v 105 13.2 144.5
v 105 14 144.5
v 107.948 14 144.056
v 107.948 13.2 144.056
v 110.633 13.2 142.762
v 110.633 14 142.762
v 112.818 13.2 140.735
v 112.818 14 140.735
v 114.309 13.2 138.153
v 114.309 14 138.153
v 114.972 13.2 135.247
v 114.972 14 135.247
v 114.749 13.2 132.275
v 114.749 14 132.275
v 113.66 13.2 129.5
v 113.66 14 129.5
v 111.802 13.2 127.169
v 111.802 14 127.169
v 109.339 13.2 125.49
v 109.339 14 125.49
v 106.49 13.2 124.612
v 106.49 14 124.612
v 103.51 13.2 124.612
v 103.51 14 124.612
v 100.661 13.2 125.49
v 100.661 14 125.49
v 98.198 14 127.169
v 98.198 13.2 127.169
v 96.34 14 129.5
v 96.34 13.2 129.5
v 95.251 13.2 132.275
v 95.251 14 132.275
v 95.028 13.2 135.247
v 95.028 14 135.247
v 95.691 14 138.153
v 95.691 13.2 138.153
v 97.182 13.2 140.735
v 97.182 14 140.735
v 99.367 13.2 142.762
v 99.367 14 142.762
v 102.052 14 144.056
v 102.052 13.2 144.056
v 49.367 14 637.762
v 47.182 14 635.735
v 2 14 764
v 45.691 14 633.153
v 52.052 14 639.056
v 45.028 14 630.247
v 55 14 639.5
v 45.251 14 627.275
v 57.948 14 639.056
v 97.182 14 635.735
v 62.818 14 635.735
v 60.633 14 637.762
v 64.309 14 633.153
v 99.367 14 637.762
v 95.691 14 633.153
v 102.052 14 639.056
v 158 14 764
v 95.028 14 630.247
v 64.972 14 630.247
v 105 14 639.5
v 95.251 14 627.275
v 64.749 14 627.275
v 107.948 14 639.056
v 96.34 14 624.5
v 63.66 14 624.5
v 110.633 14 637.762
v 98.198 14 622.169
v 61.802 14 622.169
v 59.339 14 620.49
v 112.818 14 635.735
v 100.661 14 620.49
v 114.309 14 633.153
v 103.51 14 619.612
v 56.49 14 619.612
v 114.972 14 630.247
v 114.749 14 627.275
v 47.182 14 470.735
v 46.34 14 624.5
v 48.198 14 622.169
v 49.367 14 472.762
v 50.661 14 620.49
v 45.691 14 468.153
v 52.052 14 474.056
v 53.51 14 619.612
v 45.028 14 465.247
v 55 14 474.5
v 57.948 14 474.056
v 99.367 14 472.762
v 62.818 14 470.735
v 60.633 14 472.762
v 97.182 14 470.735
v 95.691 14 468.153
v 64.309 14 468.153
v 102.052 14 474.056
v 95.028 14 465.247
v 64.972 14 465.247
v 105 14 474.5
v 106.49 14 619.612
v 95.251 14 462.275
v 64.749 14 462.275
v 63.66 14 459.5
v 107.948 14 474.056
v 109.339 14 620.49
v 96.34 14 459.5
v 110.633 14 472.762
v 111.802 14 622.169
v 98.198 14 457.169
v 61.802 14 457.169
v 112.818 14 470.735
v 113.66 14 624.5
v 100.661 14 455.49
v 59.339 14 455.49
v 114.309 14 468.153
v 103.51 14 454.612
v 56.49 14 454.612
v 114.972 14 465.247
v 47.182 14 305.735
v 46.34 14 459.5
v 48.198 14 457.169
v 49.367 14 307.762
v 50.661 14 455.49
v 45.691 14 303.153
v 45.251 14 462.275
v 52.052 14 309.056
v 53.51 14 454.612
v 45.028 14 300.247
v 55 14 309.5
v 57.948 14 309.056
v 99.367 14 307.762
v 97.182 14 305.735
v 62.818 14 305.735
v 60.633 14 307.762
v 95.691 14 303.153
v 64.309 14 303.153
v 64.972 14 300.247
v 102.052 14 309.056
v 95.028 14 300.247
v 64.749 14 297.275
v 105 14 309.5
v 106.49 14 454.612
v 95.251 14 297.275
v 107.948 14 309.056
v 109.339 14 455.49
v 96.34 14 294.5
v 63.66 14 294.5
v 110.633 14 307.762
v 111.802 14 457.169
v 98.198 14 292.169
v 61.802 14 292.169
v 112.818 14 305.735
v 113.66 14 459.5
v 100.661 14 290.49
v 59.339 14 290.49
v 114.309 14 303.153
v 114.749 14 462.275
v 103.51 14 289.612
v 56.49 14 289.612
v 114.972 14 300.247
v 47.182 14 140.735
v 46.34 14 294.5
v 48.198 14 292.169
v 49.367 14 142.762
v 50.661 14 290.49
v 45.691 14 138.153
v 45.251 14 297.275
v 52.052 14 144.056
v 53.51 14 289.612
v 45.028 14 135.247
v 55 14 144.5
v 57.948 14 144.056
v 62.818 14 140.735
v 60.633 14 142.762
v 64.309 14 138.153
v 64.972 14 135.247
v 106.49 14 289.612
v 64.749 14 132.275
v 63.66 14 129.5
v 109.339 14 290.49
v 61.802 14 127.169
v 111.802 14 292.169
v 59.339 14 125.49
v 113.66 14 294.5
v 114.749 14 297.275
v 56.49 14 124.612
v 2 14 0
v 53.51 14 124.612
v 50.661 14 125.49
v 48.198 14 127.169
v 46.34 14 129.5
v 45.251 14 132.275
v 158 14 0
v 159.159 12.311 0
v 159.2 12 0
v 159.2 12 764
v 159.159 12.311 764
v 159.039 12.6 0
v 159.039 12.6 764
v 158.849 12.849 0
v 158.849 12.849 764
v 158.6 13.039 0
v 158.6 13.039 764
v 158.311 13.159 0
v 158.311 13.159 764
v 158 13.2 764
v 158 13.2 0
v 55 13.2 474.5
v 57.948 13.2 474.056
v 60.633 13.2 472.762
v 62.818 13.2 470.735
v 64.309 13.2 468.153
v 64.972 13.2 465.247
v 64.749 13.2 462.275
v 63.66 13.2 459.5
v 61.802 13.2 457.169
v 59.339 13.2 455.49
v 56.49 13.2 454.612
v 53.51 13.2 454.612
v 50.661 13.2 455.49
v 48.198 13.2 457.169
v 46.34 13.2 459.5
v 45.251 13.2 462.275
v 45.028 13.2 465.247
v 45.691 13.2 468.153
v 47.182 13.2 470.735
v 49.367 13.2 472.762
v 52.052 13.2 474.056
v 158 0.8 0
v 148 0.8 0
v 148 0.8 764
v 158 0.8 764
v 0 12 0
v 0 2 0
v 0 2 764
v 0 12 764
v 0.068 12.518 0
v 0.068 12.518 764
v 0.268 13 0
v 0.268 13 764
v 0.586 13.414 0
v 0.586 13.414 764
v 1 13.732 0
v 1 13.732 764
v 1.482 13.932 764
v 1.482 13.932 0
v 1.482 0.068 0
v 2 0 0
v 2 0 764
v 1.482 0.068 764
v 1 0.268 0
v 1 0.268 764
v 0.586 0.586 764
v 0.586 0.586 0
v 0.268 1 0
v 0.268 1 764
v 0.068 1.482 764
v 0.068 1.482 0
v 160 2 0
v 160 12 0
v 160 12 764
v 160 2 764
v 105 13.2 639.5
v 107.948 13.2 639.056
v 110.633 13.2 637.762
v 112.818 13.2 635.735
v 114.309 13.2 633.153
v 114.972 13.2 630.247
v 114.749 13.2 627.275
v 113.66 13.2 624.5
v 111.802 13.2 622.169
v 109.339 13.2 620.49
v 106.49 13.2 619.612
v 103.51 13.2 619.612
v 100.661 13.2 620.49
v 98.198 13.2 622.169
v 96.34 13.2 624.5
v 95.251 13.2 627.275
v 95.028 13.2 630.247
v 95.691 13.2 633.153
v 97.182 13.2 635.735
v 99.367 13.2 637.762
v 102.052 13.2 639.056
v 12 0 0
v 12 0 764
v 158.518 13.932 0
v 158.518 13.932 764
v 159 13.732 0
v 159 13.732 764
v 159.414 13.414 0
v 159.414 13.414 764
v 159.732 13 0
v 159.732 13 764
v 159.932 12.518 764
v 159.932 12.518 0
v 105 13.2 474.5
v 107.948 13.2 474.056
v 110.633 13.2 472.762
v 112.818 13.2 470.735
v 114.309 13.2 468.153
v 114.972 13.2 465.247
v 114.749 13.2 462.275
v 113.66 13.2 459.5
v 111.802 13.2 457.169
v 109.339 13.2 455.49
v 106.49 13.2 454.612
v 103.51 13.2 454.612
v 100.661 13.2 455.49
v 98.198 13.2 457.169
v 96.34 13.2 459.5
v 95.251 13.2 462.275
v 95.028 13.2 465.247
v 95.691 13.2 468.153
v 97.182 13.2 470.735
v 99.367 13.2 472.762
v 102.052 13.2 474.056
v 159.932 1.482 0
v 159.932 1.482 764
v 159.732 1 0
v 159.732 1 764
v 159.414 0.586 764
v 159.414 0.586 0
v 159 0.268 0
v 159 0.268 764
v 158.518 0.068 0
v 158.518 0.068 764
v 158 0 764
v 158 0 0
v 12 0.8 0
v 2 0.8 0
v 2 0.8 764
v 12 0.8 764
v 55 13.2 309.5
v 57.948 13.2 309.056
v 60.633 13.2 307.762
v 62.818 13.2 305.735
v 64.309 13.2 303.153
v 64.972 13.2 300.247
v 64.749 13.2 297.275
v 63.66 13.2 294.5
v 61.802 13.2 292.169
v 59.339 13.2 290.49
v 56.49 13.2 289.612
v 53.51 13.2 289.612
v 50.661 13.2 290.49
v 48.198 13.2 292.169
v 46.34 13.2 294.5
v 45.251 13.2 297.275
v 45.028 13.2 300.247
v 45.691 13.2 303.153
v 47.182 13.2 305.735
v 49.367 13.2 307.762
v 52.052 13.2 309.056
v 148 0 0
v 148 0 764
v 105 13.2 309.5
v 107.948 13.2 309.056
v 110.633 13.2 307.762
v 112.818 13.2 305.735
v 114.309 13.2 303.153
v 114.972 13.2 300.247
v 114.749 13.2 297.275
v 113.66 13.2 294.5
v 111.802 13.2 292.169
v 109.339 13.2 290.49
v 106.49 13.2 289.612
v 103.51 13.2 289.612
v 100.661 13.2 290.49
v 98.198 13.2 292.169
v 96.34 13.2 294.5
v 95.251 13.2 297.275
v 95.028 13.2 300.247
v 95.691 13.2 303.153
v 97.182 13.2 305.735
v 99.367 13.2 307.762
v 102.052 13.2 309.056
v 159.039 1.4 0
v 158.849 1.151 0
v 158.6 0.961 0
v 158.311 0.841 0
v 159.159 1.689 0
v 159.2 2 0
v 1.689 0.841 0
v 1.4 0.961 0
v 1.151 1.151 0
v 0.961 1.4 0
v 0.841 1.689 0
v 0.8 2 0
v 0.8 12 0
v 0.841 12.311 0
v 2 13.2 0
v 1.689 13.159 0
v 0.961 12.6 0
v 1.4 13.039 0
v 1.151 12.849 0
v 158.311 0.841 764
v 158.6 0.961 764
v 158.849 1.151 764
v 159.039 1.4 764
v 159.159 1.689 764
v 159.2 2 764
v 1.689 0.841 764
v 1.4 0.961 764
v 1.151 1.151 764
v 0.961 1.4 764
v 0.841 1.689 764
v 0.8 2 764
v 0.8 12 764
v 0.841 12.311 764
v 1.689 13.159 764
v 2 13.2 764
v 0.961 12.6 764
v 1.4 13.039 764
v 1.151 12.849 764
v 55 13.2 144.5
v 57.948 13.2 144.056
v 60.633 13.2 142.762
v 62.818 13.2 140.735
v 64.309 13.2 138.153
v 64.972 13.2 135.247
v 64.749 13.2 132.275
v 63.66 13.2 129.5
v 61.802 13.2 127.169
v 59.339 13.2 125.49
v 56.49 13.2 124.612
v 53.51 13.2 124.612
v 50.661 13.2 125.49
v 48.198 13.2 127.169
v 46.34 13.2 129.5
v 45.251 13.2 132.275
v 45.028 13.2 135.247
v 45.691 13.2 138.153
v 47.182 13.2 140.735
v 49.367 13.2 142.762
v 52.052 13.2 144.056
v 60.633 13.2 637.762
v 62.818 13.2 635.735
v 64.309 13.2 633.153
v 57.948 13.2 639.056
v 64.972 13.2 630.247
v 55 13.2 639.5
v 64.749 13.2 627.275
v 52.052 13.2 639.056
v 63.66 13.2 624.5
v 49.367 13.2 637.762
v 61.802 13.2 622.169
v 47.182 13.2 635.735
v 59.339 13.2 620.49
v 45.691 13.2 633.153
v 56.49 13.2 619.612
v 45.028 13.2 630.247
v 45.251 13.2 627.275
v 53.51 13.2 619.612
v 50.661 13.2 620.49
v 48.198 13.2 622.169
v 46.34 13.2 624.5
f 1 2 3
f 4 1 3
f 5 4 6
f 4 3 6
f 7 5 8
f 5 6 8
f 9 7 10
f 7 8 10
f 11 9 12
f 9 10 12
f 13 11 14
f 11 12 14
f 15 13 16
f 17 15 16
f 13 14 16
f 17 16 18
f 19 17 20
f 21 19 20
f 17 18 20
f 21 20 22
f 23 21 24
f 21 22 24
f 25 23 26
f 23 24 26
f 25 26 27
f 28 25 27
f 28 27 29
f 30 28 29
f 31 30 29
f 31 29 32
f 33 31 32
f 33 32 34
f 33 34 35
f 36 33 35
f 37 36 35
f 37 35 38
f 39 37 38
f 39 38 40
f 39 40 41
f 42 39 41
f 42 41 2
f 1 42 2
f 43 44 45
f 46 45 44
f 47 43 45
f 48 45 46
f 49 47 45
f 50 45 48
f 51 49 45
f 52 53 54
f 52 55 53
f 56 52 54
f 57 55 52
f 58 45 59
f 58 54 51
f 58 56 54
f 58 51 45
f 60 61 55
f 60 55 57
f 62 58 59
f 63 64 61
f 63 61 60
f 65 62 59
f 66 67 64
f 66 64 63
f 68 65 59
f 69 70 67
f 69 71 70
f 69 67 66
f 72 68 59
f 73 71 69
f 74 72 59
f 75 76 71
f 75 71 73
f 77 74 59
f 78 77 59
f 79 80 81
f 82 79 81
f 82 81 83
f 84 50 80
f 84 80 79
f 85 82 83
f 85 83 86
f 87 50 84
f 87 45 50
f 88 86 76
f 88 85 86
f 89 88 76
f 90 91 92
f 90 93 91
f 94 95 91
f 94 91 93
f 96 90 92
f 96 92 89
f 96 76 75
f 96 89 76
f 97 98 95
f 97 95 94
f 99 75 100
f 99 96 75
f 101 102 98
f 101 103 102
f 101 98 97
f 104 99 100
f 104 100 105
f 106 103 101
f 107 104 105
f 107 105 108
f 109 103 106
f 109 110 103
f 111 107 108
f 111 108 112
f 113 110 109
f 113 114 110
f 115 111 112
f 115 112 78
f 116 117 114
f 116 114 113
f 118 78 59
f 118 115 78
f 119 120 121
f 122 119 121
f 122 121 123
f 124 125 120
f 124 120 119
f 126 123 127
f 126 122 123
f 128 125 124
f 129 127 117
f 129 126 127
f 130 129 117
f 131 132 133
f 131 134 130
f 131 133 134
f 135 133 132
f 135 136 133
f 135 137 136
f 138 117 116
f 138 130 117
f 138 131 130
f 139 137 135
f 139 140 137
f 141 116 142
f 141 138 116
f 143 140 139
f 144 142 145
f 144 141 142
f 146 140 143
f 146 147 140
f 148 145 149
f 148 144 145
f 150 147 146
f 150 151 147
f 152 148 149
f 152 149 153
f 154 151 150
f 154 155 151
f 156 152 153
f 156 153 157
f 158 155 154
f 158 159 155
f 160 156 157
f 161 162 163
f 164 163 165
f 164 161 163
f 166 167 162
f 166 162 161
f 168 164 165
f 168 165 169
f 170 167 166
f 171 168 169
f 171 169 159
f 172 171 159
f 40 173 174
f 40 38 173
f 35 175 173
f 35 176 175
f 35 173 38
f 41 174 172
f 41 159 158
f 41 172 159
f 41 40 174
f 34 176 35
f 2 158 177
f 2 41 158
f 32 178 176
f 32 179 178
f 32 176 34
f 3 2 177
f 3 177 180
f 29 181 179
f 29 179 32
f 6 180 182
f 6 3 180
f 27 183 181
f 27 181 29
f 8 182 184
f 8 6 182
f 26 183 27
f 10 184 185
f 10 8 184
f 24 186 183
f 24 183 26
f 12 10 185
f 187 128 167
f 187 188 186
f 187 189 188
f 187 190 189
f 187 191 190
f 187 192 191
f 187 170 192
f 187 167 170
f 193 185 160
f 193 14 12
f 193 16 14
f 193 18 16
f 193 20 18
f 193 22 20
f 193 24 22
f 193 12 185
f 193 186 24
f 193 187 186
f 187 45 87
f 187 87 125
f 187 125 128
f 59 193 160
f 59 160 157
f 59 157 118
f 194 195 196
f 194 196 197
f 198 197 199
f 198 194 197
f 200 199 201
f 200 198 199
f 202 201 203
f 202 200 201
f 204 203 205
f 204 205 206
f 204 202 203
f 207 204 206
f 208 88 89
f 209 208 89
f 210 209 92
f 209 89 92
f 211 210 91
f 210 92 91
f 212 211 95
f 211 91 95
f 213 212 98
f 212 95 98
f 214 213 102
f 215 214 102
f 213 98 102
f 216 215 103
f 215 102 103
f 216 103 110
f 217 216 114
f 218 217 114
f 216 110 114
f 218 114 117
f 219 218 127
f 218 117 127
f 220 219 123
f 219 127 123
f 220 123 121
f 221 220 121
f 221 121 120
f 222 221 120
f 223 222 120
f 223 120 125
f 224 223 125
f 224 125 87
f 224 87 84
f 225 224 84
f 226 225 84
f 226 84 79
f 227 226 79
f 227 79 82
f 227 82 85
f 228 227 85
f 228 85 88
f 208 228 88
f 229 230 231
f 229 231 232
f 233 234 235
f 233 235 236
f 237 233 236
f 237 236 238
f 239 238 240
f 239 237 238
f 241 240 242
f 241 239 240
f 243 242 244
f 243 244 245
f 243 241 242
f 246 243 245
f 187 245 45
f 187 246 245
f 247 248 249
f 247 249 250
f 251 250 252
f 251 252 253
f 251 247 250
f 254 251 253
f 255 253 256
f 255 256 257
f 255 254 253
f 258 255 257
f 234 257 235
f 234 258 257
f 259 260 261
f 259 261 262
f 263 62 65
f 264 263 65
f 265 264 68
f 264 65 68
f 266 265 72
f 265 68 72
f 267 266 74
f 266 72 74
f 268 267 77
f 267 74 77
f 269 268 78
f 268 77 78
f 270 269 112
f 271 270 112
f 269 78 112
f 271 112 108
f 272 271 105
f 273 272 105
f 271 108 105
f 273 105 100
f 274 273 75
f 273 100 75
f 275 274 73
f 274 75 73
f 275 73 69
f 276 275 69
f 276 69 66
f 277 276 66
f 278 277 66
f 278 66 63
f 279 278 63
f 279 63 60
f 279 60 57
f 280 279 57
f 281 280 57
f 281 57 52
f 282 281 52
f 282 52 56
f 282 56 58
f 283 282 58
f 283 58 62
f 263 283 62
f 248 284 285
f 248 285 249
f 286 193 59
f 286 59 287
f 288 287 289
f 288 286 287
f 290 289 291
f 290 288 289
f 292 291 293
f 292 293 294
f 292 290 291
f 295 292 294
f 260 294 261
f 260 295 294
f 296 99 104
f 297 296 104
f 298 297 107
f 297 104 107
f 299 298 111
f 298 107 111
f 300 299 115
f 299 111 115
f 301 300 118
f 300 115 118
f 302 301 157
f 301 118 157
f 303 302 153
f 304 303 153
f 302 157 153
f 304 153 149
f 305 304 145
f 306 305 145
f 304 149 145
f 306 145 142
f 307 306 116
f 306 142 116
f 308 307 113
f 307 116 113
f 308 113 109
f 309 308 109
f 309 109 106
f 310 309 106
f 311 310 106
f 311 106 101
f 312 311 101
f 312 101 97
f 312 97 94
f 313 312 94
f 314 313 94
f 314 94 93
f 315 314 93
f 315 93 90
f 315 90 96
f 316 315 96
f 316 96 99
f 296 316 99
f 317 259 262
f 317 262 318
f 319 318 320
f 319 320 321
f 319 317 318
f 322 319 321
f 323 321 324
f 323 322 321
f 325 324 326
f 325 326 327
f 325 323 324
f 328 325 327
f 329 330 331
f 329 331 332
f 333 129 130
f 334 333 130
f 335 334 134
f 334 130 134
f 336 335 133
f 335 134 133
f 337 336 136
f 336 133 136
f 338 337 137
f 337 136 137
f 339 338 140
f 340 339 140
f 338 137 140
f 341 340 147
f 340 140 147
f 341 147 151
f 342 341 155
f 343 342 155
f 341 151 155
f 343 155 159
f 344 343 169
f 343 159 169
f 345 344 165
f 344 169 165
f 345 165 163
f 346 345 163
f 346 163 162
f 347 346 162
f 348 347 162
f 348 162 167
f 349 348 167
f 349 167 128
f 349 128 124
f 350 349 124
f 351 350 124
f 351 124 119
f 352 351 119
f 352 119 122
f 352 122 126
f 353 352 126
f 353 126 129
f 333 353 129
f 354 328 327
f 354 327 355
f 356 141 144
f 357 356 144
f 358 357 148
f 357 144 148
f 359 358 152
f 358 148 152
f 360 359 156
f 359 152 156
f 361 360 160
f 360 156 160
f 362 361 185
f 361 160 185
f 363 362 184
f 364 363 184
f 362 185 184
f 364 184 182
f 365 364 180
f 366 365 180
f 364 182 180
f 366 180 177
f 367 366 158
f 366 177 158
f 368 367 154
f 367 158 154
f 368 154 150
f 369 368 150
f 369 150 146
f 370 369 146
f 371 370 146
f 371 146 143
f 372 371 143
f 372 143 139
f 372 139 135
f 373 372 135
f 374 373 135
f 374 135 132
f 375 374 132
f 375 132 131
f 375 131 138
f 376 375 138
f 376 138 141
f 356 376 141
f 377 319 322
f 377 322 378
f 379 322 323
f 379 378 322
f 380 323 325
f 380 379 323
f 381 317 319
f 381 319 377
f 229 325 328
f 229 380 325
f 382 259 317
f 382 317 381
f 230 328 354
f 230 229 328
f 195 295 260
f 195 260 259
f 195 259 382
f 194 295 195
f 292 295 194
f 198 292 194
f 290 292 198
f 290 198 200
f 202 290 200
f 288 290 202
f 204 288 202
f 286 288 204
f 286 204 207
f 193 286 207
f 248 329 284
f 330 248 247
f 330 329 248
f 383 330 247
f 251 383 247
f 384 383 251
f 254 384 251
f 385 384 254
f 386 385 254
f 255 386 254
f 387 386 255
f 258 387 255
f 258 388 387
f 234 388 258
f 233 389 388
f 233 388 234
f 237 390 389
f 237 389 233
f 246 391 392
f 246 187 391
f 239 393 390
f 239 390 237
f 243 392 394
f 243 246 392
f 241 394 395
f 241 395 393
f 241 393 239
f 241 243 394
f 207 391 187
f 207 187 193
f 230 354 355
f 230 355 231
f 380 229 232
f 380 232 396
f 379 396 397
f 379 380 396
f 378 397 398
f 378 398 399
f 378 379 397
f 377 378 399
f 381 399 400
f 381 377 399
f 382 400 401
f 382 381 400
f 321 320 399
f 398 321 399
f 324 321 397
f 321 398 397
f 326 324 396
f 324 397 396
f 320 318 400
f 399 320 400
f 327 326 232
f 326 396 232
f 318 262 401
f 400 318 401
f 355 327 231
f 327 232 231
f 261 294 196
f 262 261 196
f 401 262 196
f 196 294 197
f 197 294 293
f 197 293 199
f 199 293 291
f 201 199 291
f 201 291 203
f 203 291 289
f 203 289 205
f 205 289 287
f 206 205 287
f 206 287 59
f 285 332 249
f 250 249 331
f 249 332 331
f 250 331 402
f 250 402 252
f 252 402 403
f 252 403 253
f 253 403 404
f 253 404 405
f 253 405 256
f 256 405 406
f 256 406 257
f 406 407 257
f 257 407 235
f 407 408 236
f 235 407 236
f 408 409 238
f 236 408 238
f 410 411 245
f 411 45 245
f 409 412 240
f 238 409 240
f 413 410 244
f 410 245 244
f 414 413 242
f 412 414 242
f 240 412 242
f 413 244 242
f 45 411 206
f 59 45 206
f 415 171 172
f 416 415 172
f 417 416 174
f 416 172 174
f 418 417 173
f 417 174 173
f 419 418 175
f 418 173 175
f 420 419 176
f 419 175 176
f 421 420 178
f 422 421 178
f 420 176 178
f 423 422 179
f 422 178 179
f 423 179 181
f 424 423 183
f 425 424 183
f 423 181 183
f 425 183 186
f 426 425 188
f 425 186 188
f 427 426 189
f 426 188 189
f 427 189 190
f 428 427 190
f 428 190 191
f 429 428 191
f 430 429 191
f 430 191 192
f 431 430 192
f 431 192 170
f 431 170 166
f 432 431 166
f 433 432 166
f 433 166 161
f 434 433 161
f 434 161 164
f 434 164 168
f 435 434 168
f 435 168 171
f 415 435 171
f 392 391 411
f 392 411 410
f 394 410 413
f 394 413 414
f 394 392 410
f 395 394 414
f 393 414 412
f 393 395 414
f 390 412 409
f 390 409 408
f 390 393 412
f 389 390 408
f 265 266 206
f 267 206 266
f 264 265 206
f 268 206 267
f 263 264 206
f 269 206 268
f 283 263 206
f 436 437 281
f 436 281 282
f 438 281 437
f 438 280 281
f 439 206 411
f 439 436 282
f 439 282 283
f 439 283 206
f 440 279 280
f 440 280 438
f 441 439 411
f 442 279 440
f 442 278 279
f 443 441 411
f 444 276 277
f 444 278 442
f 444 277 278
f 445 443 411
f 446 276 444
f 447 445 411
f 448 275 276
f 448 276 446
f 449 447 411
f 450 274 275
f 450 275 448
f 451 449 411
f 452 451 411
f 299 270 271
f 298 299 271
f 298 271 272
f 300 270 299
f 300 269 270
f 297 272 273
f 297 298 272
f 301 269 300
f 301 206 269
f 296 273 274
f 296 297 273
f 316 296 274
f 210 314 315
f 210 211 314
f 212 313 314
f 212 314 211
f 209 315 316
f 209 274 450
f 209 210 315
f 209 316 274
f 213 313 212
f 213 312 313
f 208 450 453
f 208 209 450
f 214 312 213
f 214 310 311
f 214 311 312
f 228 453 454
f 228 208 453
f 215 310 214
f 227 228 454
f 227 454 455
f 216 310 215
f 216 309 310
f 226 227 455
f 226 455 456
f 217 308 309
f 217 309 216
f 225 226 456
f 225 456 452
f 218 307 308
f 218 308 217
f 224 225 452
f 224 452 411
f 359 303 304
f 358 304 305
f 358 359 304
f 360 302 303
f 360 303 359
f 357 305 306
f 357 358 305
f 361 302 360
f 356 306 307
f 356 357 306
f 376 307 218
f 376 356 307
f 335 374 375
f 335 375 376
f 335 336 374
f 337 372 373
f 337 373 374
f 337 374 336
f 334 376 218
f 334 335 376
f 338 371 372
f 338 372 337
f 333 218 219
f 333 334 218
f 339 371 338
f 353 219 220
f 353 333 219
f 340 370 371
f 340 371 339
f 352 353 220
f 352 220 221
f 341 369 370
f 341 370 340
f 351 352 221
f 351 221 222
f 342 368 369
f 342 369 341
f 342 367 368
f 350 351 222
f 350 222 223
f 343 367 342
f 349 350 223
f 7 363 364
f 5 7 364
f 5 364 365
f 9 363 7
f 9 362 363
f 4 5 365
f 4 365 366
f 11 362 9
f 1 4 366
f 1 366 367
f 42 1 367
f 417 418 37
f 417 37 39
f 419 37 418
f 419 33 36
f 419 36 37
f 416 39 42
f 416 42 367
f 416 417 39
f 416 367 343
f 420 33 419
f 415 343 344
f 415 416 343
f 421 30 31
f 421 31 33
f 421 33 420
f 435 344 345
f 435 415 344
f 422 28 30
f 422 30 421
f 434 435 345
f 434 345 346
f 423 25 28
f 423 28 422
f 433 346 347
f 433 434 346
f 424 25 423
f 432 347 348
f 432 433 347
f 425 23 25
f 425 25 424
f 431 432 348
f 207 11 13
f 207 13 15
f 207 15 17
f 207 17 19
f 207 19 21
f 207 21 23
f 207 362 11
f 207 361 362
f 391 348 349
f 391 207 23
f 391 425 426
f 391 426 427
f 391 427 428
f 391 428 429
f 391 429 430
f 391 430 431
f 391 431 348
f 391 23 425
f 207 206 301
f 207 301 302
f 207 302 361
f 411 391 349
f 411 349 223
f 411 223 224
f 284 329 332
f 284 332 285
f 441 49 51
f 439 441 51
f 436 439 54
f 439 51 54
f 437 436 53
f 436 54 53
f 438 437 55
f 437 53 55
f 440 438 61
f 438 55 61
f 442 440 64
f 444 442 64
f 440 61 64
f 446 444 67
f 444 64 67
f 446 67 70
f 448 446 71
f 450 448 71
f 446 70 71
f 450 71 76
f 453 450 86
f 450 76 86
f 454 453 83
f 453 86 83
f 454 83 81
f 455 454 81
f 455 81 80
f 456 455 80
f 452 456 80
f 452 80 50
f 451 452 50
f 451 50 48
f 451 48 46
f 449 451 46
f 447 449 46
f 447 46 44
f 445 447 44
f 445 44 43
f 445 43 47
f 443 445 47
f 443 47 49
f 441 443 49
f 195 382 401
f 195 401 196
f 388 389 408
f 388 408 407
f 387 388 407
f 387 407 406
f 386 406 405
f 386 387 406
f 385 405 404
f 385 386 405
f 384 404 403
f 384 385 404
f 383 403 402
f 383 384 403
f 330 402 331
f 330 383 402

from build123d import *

# Parameters (mm, degrees)
BASE_FLANGE1_DEPTH = 764
SKETCH6_R          = 10
CUT_EXTRUDE1_DEPTH = 10


# Sheet-metal steps are written as plain solids
with BuildPart() as part:
    # Sketch1 → Base-Flange1 (new body)
    with BuildSketch(Plane.XY):
        with BuildLine():
            Line((12, 0), (2, 0))
            ThreePointArc((2, 0), (0.585786438, 0.585786438), (0, 2))
            Line((0, 2), (0, 12))
            ThreePointArc((0, 12), (0.585786438, 13.414213562), (2, 14))
            Line((2, 14), (158, 14))
            ThreePointArc((158, 14), (159.414213562, 13.414213562), (160, 12))
            Line((160, 12), (160, 2))
            ThreePointArc((160, 2), (159.414213562, 0.585786438), (158, 0))
            Line((158, 0), (148, 0))
            Line((148, 0), (148, 0.8))
            Line((148, 0.8), (158, 0.8))
            ThreePointArc((158, 0.8), (158.848528137, 1.151471863), (159.2, 2))
            Line((159.2, 2), (159.2, 12))
            ThreePointArc((159.2, 12), (158.848528137, 12.848528137), (158, 13.2))
            Line((158, 13.2), (2, 13.2))
            ThreePointArc((2, 13.2), (1.151471863, 12.848528137), (0.8, 12))
            Line((0.8, 12), (0.8, 2))
            ThreePointArc((0.8, 2), (1.151471863, 1.151471863), (2, 0.8))
            Line((2, 0.8), (12, 0.8))
            Line((12, 0.8), (12, 0))
        make_face()
    extrude(amount=BASE_FLANGE1_DEPTH)

    # Sketch6 → Cut-Extrude1 (cut)
    with BuildSketch(Plane(origin=(0, 14, 0), x_dir=(1, 0, 0), z_dir=(0, 1, 0))):
        with Locations(Location((105, -299.5, 0), (0, 0, 270))):
            Circle(SKETCH6_R)
        with Locations(Location((105, -134.5, 0), (0, 0, 270))):
            Circle(SKETCH6_R)
        with Locations(Location((105, -464.5, 0), (0, 0, 270))):
            Circle(SKETCH6_R)
        with Locations(Location((105, -629.5, 0), (0, 0, 270))):
            Circle(SKETCH6_R)
        with Locations(Location((55, -629.5, 0), (0, 0, 270))):
            Circle(SKETCH6_R)
        with Locations(Location((55, -464.5, 0), (0, 0, 270))):
            Circle(SKETCH6_R)
        with Locations(Location((55, -299.5, 0), (0, 0, 270))):
            Circle(SKETCH6_R)
        with Locations(Location((55, -134.5, 0), (0, 0, 270))):
            Circle(SKETCH6_R)
    extrude(amount=-CUT_EXTRUDE1_DEPTH, mode=Mode.SUBTRACT)


solid = part.part
